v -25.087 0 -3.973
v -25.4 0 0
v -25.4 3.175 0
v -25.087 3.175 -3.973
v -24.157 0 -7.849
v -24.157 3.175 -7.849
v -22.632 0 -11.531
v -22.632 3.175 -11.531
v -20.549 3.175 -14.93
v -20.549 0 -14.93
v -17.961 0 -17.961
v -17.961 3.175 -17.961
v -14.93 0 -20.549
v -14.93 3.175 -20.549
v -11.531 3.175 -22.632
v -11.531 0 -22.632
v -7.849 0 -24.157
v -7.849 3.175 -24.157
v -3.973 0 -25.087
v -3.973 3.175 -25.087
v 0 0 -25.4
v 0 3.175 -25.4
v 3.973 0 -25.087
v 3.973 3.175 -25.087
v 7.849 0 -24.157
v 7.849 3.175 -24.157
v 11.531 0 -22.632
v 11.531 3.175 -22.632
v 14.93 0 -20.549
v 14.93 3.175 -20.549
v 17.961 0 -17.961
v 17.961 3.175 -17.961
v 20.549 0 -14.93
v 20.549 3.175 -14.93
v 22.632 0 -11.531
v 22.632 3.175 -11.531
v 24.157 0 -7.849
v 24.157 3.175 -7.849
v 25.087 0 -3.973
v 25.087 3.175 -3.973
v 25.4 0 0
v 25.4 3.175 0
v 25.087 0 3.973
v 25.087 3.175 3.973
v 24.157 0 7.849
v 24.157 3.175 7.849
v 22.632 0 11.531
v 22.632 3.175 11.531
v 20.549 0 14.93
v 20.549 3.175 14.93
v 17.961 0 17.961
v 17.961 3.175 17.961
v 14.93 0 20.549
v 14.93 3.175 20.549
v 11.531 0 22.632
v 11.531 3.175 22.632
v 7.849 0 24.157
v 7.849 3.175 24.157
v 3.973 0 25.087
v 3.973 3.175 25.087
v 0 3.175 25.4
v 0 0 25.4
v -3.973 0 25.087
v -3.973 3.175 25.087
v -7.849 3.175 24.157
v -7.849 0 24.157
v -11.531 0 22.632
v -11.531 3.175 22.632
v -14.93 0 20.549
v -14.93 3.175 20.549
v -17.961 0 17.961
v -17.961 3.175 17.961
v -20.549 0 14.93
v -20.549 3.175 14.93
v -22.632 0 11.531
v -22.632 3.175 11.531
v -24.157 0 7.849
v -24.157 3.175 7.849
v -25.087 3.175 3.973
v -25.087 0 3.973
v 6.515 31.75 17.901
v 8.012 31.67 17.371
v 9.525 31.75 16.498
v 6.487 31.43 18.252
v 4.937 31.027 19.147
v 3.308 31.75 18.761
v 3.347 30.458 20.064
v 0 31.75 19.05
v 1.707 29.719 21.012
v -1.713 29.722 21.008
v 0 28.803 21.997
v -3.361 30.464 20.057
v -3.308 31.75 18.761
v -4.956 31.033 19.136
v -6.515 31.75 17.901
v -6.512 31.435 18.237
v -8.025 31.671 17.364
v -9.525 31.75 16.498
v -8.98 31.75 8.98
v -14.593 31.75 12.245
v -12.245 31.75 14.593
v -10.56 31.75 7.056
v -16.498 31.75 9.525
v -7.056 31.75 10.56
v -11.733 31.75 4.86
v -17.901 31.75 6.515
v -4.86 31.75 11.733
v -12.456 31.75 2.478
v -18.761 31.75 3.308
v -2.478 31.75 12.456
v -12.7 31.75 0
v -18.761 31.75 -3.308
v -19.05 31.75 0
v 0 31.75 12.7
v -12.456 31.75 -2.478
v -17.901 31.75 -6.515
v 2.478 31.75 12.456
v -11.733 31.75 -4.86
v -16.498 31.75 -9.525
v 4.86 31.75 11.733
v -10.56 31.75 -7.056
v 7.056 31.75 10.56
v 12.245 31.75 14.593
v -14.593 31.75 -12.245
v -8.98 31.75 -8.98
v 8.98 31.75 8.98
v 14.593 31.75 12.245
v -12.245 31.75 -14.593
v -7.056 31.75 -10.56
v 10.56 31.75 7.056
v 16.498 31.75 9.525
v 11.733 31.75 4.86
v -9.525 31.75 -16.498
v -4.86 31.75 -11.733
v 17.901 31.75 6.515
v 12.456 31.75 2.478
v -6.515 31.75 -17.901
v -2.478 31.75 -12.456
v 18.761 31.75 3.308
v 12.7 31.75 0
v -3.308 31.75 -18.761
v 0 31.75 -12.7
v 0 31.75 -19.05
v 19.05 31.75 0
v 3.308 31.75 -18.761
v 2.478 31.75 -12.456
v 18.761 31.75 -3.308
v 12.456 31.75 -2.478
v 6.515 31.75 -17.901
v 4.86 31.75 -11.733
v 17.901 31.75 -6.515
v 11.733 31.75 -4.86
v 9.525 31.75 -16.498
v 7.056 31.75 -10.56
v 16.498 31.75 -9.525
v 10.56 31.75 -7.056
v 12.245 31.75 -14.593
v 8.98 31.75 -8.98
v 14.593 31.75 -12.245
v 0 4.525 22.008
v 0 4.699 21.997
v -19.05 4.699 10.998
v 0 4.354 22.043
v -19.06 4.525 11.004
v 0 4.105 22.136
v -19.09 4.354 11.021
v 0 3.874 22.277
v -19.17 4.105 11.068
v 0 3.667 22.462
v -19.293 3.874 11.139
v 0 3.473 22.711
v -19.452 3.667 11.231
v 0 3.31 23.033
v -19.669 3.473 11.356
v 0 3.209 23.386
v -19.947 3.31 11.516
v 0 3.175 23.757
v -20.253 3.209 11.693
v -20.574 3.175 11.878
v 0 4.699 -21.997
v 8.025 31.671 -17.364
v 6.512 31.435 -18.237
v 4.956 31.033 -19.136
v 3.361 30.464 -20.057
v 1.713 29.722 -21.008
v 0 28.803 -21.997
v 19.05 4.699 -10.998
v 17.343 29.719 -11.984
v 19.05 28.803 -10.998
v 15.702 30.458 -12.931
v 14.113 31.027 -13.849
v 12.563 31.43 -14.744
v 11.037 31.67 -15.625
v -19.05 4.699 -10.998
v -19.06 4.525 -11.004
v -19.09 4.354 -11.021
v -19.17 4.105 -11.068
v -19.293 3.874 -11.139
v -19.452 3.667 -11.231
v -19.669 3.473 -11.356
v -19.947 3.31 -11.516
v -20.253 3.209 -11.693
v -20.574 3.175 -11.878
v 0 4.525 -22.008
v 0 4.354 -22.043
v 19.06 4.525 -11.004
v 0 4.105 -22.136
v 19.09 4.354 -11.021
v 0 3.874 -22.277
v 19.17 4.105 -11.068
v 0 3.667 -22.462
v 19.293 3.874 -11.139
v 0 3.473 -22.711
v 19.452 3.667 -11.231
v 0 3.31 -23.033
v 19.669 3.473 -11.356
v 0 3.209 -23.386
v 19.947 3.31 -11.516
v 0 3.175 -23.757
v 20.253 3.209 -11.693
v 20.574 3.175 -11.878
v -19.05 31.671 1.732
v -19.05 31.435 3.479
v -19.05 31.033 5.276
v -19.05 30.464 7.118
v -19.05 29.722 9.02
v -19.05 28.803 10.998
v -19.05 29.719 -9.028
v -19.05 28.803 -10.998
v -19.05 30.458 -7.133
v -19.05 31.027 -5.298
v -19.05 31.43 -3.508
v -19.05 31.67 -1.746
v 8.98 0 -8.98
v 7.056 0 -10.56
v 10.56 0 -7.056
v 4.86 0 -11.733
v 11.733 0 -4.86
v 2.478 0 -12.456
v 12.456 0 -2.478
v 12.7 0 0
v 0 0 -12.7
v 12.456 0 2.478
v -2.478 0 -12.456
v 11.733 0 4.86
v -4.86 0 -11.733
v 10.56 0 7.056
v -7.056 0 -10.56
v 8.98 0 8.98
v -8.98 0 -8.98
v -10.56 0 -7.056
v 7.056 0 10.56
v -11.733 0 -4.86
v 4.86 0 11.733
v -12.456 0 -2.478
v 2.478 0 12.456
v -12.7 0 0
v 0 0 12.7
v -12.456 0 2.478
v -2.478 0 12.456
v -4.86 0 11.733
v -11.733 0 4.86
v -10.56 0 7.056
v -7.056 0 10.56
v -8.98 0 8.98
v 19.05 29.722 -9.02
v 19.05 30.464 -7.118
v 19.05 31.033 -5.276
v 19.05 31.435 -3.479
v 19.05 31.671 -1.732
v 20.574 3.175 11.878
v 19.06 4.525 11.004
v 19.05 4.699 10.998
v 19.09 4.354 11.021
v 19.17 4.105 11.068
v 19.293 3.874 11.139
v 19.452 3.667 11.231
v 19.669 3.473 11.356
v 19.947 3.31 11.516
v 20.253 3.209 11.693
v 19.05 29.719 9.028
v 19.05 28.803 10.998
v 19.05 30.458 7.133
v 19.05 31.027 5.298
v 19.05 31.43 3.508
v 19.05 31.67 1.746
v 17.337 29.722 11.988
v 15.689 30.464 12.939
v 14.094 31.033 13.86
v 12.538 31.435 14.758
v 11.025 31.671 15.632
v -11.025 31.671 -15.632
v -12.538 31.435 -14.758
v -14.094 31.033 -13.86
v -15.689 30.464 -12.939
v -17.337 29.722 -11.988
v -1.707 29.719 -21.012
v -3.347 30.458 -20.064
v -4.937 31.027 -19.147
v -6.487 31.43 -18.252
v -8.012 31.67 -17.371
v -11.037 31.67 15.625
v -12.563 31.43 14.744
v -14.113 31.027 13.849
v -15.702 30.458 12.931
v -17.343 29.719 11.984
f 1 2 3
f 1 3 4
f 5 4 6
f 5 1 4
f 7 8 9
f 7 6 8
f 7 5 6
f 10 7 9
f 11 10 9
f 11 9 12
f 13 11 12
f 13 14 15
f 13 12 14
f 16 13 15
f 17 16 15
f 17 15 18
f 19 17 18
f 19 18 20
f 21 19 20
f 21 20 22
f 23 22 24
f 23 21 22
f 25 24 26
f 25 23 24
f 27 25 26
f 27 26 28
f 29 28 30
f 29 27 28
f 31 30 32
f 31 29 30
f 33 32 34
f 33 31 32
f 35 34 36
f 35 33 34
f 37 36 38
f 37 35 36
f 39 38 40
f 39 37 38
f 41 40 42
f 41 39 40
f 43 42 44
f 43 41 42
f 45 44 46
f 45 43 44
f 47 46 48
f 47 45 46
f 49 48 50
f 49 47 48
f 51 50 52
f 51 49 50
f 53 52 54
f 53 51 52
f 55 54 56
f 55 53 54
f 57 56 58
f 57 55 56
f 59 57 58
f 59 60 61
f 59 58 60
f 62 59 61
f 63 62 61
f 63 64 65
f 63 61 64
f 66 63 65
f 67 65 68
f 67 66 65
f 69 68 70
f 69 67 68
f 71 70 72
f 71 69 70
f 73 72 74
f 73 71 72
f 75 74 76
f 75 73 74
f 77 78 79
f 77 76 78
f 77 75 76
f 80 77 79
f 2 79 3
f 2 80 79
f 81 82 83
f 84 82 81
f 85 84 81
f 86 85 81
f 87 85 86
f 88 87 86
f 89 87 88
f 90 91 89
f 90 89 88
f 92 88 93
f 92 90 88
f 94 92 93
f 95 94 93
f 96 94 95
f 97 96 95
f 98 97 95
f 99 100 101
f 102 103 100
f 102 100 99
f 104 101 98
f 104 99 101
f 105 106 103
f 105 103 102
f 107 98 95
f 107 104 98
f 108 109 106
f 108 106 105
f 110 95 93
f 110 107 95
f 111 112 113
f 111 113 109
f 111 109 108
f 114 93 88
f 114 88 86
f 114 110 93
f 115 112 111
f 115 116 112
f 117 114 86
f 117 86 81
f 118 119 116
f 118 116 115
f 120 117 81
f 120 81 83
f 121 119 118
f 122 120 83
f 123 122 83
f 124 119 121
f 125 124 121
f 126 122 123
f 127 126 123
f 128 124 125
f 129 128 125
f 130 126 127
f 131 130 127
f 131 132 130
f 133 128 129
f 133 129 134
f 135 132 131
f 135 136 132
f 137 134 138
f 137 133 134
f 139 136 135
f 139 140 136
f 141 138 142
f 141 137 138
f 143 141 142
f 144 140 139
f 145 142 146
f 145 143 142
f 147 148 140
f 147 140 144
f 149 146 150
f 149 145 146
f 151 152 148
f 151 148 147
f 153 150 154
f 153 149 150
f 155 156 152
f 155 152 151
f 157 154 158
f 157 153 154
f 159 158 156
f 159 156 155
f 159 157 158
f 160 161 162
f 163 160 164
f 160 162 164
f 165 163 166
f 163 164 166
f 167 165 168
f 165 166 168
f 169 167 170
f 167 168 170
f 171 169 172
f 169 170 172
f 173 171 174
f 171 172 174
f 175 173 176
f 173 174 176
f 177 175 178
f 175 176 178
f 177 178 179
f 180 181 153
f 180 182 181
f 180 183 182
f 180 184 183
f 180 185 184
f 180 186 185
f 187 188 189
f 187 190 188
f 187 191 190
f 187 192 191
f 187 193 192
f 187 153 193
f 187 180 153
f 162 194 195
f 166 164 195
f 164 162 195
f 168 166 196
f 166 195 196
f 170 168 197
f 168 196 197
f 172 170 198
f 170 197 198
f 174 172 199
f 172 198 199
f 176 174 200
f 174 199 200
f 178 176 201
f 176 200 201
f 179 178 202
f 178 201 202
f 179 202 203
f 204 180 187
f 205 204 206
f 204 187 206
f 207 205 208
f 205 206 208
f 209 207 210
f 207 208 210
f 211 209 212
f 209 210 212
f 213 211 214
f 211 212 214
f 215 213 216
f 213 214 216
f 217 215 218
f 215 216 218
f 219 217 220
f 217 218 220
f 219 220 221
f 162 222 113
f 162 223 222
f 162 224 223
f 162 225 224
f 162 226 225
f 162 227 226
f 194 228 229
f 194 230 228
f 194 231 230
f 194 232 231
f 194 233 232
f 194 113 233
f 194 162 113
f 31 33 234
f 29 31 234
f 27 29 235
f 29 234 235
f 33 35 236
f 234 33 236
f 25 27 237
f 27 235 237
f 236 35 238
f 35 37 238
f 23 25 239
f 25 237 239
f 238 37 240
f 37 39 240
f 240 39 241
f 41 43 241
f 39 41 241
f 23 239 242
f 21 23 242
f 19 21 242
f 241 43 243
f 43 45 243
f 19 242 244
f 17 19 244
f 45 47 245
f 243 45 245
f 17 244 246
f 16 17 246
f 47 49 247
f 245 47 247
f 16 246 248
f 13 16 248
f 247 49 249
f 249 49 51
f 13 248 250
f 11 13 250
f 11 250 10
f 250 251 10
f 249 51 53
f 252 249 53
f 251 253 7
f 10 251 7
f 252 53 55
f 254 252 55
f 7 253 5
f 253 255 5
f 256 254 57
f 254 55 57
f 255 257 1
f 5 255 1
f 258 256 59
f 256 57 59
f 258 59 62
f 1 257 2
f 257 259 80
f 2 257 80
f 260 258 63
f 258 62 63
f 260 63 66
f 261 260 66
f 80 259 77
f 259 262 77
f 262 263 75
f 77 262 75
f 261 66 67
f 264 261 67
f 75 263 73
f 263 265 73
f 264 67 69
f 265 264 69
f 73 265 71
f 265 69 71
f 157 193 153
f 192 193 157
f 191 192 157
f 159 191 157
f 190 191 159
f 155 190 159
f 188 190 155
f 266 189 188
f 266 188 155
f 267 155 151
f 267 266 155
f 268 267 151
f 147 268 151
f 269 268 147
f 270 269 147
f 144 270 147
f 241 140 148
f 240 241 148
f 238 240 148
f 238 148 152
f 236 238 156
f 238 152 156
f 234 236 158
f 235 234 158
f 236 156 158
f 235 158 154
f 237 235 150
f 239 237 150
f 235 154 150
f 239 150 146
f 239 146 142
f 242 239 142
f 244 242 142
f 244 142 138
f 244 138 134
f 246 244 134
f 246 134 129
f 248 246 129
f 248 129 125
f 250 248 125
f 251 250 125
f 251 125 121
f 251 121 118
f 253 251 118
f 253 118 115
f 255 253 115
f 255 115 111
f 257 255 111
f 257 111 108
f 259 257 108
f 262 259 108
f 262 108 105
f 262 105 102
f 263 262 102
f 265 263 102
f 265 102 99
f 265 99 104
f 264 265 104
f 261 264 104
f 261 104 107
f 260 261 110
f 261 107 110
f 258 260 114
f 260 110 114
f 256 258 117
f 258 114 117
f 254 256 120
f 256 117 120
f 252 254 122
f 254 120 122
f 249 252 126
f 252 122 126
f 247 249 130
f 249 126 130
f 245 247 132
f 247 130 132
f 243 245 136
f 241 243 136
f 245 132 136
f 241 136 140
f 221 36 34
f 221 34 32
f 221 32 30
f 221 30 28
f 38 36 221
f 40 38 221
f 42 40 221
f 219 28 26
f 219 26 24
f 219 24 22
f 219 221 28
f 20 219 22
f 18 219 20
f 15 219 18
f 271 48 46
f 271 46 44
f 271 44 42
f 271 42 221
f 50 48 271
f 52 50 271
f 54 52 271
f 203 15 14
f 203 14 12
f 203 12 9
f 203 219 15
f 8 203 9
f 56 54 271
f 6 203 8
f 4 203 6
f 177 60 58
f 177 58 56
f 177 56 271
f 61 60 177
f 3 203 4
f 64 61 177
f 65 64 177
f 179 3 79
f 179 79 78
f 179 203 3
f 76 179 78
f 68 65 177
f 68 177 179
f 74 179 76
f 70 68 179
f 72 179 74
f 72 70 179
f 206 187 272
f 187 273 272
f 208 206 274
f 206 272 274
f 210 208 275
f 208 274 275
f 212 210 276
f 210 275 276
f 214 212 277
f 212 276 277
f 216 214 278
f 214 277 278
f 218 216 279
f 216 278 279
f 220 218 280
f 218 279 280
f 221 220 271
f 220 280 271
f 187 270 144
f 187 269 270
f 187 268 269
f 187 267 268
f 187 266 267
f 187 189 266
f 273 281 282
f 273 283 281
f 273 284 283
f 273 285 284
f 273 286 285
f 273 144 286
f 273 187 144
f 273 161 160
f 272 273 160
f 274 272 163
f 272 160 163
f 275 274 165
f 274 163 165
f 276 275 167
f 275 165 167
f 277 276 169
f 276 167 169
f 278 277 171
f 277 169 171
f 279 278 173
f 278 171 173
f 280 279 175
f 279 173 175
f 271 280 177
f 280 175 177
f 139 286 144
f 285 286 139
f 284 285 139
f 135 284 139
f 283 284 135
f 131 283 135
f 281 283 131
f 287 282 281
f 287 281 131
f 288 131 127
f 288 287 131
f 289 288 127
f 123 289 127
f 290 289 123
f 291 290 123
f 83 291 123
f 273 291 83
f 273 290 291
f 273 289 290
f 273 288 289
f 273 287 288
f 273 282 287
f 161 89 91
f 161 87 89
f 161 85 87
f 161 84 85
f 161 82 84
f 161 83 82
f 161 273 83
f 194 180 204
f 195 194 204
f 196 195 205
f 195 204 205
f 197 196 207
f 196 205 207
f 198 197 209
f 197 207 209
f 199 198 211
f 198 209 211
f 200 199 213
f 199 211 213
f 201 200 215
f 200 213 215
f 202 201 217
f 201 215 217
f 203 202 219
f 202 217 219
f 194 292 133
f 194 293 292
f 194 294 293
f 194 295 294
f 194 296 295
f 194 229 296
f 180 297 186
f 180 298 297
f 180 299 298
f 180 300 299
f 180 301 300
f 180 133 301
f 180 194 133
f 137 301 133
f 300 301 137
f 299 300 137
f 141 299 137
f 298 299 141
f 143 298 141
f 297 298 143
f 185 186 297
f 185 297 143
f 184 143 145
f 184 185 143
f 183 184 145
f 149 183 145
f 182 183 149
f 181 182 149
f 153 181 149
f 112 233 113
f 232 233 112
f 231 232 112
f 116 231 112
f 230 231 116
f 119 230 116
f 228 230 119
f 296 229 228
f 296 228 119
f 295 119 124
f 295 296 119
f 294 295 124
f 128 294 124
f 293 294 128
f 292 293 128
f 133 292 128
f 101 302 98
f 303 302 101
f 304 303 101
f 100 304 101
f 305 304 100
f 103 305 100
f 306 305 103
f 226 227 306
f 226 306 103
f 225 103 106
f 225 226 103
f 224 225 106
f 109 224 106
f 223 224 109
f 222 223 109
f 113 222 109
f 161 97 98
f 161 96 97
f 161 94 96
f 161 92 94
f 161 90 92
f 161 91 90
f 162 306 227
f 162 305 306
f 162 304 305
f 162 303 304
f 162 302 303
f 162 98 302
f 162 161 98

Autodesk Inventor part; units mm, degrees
ref_plane "YZ Plane" through (0, 0, 0) normal (1, 0, 0) x (0, 1, 0)
ref_plane "XZ Plane" through (0, 0, 0) normal (0, 1, 0) x (-1, 0, 0)
ref_plane "XY Plane" through (0, 0, 0) normal (0, 0, 1) x (1, 0, 0)
sketch "Sketch1" plane through (0, 0, 0) normal (0, 1, 0) x (-1, 0, 0)
  circle A0 centre (0, 0) radius 25.4
  dimension "d0" = 50.8
extrude "Extrusion1" add sketch "Sketch1" along normal blind 3.175
sketch "Sketch2" plane through (0, 3.175, 0) normal (0, 1, 0) x (1, 0, 0)
  circle A0 centre (0, 0) radius 19.05
  line L0 (-19.05, -10.9985) -> (-19.05, 10.9985)
  line L1 (-19.05, 10.9985) -> (0, 21.997)
  line L2 (0, 21.997) -> (19.05, 10.9985)
  line L3 (19.05, 10.9985) -> (19.05, -10.9985)
  line L4 (19.05, -10.9985) -> (0, -21.997)
  line L5 (0, -21.997) -> (-19.05, -10.9985)
  point P0 (-9.525, -16.4978)
  dimension "d3" = 38.1
extrude "Extrusion2" add sketch "Sketch2" along normal blind 28.575
sketch "Sketch3" plane through (0, 31.75, 0) normal (0, 1, 0) x (1, 0, 0)
  circle A0 centre (0, 0) radius 12.7
  dimension "d7" = 25.4
extrude "Extrusion3" cut sketch "Sketch3" against normal through all
thread "Thread1" size "1-8 UNC" class "2B" standard "ANSI Unified Screw Threads" full length
sketch "Sketch6" plane through (0, 31.75, 0) normal (0, 1, 0) x (1, 0, 0)
  circle A0 centre (0, 0) radius 19.05
  line L0 (-19.05, -10.9985) -> (0, -21.997) projected
extrude "Extrusion5" cut sketch "Sketch6" against normal through all draft 45 keep common part
fillet "Fillet2" radius 1.524 6 edges at (-19.05, 3.175, 0) (-9.525, 3.175, 16.4978) (9.525, 3.175, 16.4978) (-9.525, 3.175, -16.4978) (9.525, 3.175, -16.4978) (19.05, 3.175, 0)
properties part number "13_17"
